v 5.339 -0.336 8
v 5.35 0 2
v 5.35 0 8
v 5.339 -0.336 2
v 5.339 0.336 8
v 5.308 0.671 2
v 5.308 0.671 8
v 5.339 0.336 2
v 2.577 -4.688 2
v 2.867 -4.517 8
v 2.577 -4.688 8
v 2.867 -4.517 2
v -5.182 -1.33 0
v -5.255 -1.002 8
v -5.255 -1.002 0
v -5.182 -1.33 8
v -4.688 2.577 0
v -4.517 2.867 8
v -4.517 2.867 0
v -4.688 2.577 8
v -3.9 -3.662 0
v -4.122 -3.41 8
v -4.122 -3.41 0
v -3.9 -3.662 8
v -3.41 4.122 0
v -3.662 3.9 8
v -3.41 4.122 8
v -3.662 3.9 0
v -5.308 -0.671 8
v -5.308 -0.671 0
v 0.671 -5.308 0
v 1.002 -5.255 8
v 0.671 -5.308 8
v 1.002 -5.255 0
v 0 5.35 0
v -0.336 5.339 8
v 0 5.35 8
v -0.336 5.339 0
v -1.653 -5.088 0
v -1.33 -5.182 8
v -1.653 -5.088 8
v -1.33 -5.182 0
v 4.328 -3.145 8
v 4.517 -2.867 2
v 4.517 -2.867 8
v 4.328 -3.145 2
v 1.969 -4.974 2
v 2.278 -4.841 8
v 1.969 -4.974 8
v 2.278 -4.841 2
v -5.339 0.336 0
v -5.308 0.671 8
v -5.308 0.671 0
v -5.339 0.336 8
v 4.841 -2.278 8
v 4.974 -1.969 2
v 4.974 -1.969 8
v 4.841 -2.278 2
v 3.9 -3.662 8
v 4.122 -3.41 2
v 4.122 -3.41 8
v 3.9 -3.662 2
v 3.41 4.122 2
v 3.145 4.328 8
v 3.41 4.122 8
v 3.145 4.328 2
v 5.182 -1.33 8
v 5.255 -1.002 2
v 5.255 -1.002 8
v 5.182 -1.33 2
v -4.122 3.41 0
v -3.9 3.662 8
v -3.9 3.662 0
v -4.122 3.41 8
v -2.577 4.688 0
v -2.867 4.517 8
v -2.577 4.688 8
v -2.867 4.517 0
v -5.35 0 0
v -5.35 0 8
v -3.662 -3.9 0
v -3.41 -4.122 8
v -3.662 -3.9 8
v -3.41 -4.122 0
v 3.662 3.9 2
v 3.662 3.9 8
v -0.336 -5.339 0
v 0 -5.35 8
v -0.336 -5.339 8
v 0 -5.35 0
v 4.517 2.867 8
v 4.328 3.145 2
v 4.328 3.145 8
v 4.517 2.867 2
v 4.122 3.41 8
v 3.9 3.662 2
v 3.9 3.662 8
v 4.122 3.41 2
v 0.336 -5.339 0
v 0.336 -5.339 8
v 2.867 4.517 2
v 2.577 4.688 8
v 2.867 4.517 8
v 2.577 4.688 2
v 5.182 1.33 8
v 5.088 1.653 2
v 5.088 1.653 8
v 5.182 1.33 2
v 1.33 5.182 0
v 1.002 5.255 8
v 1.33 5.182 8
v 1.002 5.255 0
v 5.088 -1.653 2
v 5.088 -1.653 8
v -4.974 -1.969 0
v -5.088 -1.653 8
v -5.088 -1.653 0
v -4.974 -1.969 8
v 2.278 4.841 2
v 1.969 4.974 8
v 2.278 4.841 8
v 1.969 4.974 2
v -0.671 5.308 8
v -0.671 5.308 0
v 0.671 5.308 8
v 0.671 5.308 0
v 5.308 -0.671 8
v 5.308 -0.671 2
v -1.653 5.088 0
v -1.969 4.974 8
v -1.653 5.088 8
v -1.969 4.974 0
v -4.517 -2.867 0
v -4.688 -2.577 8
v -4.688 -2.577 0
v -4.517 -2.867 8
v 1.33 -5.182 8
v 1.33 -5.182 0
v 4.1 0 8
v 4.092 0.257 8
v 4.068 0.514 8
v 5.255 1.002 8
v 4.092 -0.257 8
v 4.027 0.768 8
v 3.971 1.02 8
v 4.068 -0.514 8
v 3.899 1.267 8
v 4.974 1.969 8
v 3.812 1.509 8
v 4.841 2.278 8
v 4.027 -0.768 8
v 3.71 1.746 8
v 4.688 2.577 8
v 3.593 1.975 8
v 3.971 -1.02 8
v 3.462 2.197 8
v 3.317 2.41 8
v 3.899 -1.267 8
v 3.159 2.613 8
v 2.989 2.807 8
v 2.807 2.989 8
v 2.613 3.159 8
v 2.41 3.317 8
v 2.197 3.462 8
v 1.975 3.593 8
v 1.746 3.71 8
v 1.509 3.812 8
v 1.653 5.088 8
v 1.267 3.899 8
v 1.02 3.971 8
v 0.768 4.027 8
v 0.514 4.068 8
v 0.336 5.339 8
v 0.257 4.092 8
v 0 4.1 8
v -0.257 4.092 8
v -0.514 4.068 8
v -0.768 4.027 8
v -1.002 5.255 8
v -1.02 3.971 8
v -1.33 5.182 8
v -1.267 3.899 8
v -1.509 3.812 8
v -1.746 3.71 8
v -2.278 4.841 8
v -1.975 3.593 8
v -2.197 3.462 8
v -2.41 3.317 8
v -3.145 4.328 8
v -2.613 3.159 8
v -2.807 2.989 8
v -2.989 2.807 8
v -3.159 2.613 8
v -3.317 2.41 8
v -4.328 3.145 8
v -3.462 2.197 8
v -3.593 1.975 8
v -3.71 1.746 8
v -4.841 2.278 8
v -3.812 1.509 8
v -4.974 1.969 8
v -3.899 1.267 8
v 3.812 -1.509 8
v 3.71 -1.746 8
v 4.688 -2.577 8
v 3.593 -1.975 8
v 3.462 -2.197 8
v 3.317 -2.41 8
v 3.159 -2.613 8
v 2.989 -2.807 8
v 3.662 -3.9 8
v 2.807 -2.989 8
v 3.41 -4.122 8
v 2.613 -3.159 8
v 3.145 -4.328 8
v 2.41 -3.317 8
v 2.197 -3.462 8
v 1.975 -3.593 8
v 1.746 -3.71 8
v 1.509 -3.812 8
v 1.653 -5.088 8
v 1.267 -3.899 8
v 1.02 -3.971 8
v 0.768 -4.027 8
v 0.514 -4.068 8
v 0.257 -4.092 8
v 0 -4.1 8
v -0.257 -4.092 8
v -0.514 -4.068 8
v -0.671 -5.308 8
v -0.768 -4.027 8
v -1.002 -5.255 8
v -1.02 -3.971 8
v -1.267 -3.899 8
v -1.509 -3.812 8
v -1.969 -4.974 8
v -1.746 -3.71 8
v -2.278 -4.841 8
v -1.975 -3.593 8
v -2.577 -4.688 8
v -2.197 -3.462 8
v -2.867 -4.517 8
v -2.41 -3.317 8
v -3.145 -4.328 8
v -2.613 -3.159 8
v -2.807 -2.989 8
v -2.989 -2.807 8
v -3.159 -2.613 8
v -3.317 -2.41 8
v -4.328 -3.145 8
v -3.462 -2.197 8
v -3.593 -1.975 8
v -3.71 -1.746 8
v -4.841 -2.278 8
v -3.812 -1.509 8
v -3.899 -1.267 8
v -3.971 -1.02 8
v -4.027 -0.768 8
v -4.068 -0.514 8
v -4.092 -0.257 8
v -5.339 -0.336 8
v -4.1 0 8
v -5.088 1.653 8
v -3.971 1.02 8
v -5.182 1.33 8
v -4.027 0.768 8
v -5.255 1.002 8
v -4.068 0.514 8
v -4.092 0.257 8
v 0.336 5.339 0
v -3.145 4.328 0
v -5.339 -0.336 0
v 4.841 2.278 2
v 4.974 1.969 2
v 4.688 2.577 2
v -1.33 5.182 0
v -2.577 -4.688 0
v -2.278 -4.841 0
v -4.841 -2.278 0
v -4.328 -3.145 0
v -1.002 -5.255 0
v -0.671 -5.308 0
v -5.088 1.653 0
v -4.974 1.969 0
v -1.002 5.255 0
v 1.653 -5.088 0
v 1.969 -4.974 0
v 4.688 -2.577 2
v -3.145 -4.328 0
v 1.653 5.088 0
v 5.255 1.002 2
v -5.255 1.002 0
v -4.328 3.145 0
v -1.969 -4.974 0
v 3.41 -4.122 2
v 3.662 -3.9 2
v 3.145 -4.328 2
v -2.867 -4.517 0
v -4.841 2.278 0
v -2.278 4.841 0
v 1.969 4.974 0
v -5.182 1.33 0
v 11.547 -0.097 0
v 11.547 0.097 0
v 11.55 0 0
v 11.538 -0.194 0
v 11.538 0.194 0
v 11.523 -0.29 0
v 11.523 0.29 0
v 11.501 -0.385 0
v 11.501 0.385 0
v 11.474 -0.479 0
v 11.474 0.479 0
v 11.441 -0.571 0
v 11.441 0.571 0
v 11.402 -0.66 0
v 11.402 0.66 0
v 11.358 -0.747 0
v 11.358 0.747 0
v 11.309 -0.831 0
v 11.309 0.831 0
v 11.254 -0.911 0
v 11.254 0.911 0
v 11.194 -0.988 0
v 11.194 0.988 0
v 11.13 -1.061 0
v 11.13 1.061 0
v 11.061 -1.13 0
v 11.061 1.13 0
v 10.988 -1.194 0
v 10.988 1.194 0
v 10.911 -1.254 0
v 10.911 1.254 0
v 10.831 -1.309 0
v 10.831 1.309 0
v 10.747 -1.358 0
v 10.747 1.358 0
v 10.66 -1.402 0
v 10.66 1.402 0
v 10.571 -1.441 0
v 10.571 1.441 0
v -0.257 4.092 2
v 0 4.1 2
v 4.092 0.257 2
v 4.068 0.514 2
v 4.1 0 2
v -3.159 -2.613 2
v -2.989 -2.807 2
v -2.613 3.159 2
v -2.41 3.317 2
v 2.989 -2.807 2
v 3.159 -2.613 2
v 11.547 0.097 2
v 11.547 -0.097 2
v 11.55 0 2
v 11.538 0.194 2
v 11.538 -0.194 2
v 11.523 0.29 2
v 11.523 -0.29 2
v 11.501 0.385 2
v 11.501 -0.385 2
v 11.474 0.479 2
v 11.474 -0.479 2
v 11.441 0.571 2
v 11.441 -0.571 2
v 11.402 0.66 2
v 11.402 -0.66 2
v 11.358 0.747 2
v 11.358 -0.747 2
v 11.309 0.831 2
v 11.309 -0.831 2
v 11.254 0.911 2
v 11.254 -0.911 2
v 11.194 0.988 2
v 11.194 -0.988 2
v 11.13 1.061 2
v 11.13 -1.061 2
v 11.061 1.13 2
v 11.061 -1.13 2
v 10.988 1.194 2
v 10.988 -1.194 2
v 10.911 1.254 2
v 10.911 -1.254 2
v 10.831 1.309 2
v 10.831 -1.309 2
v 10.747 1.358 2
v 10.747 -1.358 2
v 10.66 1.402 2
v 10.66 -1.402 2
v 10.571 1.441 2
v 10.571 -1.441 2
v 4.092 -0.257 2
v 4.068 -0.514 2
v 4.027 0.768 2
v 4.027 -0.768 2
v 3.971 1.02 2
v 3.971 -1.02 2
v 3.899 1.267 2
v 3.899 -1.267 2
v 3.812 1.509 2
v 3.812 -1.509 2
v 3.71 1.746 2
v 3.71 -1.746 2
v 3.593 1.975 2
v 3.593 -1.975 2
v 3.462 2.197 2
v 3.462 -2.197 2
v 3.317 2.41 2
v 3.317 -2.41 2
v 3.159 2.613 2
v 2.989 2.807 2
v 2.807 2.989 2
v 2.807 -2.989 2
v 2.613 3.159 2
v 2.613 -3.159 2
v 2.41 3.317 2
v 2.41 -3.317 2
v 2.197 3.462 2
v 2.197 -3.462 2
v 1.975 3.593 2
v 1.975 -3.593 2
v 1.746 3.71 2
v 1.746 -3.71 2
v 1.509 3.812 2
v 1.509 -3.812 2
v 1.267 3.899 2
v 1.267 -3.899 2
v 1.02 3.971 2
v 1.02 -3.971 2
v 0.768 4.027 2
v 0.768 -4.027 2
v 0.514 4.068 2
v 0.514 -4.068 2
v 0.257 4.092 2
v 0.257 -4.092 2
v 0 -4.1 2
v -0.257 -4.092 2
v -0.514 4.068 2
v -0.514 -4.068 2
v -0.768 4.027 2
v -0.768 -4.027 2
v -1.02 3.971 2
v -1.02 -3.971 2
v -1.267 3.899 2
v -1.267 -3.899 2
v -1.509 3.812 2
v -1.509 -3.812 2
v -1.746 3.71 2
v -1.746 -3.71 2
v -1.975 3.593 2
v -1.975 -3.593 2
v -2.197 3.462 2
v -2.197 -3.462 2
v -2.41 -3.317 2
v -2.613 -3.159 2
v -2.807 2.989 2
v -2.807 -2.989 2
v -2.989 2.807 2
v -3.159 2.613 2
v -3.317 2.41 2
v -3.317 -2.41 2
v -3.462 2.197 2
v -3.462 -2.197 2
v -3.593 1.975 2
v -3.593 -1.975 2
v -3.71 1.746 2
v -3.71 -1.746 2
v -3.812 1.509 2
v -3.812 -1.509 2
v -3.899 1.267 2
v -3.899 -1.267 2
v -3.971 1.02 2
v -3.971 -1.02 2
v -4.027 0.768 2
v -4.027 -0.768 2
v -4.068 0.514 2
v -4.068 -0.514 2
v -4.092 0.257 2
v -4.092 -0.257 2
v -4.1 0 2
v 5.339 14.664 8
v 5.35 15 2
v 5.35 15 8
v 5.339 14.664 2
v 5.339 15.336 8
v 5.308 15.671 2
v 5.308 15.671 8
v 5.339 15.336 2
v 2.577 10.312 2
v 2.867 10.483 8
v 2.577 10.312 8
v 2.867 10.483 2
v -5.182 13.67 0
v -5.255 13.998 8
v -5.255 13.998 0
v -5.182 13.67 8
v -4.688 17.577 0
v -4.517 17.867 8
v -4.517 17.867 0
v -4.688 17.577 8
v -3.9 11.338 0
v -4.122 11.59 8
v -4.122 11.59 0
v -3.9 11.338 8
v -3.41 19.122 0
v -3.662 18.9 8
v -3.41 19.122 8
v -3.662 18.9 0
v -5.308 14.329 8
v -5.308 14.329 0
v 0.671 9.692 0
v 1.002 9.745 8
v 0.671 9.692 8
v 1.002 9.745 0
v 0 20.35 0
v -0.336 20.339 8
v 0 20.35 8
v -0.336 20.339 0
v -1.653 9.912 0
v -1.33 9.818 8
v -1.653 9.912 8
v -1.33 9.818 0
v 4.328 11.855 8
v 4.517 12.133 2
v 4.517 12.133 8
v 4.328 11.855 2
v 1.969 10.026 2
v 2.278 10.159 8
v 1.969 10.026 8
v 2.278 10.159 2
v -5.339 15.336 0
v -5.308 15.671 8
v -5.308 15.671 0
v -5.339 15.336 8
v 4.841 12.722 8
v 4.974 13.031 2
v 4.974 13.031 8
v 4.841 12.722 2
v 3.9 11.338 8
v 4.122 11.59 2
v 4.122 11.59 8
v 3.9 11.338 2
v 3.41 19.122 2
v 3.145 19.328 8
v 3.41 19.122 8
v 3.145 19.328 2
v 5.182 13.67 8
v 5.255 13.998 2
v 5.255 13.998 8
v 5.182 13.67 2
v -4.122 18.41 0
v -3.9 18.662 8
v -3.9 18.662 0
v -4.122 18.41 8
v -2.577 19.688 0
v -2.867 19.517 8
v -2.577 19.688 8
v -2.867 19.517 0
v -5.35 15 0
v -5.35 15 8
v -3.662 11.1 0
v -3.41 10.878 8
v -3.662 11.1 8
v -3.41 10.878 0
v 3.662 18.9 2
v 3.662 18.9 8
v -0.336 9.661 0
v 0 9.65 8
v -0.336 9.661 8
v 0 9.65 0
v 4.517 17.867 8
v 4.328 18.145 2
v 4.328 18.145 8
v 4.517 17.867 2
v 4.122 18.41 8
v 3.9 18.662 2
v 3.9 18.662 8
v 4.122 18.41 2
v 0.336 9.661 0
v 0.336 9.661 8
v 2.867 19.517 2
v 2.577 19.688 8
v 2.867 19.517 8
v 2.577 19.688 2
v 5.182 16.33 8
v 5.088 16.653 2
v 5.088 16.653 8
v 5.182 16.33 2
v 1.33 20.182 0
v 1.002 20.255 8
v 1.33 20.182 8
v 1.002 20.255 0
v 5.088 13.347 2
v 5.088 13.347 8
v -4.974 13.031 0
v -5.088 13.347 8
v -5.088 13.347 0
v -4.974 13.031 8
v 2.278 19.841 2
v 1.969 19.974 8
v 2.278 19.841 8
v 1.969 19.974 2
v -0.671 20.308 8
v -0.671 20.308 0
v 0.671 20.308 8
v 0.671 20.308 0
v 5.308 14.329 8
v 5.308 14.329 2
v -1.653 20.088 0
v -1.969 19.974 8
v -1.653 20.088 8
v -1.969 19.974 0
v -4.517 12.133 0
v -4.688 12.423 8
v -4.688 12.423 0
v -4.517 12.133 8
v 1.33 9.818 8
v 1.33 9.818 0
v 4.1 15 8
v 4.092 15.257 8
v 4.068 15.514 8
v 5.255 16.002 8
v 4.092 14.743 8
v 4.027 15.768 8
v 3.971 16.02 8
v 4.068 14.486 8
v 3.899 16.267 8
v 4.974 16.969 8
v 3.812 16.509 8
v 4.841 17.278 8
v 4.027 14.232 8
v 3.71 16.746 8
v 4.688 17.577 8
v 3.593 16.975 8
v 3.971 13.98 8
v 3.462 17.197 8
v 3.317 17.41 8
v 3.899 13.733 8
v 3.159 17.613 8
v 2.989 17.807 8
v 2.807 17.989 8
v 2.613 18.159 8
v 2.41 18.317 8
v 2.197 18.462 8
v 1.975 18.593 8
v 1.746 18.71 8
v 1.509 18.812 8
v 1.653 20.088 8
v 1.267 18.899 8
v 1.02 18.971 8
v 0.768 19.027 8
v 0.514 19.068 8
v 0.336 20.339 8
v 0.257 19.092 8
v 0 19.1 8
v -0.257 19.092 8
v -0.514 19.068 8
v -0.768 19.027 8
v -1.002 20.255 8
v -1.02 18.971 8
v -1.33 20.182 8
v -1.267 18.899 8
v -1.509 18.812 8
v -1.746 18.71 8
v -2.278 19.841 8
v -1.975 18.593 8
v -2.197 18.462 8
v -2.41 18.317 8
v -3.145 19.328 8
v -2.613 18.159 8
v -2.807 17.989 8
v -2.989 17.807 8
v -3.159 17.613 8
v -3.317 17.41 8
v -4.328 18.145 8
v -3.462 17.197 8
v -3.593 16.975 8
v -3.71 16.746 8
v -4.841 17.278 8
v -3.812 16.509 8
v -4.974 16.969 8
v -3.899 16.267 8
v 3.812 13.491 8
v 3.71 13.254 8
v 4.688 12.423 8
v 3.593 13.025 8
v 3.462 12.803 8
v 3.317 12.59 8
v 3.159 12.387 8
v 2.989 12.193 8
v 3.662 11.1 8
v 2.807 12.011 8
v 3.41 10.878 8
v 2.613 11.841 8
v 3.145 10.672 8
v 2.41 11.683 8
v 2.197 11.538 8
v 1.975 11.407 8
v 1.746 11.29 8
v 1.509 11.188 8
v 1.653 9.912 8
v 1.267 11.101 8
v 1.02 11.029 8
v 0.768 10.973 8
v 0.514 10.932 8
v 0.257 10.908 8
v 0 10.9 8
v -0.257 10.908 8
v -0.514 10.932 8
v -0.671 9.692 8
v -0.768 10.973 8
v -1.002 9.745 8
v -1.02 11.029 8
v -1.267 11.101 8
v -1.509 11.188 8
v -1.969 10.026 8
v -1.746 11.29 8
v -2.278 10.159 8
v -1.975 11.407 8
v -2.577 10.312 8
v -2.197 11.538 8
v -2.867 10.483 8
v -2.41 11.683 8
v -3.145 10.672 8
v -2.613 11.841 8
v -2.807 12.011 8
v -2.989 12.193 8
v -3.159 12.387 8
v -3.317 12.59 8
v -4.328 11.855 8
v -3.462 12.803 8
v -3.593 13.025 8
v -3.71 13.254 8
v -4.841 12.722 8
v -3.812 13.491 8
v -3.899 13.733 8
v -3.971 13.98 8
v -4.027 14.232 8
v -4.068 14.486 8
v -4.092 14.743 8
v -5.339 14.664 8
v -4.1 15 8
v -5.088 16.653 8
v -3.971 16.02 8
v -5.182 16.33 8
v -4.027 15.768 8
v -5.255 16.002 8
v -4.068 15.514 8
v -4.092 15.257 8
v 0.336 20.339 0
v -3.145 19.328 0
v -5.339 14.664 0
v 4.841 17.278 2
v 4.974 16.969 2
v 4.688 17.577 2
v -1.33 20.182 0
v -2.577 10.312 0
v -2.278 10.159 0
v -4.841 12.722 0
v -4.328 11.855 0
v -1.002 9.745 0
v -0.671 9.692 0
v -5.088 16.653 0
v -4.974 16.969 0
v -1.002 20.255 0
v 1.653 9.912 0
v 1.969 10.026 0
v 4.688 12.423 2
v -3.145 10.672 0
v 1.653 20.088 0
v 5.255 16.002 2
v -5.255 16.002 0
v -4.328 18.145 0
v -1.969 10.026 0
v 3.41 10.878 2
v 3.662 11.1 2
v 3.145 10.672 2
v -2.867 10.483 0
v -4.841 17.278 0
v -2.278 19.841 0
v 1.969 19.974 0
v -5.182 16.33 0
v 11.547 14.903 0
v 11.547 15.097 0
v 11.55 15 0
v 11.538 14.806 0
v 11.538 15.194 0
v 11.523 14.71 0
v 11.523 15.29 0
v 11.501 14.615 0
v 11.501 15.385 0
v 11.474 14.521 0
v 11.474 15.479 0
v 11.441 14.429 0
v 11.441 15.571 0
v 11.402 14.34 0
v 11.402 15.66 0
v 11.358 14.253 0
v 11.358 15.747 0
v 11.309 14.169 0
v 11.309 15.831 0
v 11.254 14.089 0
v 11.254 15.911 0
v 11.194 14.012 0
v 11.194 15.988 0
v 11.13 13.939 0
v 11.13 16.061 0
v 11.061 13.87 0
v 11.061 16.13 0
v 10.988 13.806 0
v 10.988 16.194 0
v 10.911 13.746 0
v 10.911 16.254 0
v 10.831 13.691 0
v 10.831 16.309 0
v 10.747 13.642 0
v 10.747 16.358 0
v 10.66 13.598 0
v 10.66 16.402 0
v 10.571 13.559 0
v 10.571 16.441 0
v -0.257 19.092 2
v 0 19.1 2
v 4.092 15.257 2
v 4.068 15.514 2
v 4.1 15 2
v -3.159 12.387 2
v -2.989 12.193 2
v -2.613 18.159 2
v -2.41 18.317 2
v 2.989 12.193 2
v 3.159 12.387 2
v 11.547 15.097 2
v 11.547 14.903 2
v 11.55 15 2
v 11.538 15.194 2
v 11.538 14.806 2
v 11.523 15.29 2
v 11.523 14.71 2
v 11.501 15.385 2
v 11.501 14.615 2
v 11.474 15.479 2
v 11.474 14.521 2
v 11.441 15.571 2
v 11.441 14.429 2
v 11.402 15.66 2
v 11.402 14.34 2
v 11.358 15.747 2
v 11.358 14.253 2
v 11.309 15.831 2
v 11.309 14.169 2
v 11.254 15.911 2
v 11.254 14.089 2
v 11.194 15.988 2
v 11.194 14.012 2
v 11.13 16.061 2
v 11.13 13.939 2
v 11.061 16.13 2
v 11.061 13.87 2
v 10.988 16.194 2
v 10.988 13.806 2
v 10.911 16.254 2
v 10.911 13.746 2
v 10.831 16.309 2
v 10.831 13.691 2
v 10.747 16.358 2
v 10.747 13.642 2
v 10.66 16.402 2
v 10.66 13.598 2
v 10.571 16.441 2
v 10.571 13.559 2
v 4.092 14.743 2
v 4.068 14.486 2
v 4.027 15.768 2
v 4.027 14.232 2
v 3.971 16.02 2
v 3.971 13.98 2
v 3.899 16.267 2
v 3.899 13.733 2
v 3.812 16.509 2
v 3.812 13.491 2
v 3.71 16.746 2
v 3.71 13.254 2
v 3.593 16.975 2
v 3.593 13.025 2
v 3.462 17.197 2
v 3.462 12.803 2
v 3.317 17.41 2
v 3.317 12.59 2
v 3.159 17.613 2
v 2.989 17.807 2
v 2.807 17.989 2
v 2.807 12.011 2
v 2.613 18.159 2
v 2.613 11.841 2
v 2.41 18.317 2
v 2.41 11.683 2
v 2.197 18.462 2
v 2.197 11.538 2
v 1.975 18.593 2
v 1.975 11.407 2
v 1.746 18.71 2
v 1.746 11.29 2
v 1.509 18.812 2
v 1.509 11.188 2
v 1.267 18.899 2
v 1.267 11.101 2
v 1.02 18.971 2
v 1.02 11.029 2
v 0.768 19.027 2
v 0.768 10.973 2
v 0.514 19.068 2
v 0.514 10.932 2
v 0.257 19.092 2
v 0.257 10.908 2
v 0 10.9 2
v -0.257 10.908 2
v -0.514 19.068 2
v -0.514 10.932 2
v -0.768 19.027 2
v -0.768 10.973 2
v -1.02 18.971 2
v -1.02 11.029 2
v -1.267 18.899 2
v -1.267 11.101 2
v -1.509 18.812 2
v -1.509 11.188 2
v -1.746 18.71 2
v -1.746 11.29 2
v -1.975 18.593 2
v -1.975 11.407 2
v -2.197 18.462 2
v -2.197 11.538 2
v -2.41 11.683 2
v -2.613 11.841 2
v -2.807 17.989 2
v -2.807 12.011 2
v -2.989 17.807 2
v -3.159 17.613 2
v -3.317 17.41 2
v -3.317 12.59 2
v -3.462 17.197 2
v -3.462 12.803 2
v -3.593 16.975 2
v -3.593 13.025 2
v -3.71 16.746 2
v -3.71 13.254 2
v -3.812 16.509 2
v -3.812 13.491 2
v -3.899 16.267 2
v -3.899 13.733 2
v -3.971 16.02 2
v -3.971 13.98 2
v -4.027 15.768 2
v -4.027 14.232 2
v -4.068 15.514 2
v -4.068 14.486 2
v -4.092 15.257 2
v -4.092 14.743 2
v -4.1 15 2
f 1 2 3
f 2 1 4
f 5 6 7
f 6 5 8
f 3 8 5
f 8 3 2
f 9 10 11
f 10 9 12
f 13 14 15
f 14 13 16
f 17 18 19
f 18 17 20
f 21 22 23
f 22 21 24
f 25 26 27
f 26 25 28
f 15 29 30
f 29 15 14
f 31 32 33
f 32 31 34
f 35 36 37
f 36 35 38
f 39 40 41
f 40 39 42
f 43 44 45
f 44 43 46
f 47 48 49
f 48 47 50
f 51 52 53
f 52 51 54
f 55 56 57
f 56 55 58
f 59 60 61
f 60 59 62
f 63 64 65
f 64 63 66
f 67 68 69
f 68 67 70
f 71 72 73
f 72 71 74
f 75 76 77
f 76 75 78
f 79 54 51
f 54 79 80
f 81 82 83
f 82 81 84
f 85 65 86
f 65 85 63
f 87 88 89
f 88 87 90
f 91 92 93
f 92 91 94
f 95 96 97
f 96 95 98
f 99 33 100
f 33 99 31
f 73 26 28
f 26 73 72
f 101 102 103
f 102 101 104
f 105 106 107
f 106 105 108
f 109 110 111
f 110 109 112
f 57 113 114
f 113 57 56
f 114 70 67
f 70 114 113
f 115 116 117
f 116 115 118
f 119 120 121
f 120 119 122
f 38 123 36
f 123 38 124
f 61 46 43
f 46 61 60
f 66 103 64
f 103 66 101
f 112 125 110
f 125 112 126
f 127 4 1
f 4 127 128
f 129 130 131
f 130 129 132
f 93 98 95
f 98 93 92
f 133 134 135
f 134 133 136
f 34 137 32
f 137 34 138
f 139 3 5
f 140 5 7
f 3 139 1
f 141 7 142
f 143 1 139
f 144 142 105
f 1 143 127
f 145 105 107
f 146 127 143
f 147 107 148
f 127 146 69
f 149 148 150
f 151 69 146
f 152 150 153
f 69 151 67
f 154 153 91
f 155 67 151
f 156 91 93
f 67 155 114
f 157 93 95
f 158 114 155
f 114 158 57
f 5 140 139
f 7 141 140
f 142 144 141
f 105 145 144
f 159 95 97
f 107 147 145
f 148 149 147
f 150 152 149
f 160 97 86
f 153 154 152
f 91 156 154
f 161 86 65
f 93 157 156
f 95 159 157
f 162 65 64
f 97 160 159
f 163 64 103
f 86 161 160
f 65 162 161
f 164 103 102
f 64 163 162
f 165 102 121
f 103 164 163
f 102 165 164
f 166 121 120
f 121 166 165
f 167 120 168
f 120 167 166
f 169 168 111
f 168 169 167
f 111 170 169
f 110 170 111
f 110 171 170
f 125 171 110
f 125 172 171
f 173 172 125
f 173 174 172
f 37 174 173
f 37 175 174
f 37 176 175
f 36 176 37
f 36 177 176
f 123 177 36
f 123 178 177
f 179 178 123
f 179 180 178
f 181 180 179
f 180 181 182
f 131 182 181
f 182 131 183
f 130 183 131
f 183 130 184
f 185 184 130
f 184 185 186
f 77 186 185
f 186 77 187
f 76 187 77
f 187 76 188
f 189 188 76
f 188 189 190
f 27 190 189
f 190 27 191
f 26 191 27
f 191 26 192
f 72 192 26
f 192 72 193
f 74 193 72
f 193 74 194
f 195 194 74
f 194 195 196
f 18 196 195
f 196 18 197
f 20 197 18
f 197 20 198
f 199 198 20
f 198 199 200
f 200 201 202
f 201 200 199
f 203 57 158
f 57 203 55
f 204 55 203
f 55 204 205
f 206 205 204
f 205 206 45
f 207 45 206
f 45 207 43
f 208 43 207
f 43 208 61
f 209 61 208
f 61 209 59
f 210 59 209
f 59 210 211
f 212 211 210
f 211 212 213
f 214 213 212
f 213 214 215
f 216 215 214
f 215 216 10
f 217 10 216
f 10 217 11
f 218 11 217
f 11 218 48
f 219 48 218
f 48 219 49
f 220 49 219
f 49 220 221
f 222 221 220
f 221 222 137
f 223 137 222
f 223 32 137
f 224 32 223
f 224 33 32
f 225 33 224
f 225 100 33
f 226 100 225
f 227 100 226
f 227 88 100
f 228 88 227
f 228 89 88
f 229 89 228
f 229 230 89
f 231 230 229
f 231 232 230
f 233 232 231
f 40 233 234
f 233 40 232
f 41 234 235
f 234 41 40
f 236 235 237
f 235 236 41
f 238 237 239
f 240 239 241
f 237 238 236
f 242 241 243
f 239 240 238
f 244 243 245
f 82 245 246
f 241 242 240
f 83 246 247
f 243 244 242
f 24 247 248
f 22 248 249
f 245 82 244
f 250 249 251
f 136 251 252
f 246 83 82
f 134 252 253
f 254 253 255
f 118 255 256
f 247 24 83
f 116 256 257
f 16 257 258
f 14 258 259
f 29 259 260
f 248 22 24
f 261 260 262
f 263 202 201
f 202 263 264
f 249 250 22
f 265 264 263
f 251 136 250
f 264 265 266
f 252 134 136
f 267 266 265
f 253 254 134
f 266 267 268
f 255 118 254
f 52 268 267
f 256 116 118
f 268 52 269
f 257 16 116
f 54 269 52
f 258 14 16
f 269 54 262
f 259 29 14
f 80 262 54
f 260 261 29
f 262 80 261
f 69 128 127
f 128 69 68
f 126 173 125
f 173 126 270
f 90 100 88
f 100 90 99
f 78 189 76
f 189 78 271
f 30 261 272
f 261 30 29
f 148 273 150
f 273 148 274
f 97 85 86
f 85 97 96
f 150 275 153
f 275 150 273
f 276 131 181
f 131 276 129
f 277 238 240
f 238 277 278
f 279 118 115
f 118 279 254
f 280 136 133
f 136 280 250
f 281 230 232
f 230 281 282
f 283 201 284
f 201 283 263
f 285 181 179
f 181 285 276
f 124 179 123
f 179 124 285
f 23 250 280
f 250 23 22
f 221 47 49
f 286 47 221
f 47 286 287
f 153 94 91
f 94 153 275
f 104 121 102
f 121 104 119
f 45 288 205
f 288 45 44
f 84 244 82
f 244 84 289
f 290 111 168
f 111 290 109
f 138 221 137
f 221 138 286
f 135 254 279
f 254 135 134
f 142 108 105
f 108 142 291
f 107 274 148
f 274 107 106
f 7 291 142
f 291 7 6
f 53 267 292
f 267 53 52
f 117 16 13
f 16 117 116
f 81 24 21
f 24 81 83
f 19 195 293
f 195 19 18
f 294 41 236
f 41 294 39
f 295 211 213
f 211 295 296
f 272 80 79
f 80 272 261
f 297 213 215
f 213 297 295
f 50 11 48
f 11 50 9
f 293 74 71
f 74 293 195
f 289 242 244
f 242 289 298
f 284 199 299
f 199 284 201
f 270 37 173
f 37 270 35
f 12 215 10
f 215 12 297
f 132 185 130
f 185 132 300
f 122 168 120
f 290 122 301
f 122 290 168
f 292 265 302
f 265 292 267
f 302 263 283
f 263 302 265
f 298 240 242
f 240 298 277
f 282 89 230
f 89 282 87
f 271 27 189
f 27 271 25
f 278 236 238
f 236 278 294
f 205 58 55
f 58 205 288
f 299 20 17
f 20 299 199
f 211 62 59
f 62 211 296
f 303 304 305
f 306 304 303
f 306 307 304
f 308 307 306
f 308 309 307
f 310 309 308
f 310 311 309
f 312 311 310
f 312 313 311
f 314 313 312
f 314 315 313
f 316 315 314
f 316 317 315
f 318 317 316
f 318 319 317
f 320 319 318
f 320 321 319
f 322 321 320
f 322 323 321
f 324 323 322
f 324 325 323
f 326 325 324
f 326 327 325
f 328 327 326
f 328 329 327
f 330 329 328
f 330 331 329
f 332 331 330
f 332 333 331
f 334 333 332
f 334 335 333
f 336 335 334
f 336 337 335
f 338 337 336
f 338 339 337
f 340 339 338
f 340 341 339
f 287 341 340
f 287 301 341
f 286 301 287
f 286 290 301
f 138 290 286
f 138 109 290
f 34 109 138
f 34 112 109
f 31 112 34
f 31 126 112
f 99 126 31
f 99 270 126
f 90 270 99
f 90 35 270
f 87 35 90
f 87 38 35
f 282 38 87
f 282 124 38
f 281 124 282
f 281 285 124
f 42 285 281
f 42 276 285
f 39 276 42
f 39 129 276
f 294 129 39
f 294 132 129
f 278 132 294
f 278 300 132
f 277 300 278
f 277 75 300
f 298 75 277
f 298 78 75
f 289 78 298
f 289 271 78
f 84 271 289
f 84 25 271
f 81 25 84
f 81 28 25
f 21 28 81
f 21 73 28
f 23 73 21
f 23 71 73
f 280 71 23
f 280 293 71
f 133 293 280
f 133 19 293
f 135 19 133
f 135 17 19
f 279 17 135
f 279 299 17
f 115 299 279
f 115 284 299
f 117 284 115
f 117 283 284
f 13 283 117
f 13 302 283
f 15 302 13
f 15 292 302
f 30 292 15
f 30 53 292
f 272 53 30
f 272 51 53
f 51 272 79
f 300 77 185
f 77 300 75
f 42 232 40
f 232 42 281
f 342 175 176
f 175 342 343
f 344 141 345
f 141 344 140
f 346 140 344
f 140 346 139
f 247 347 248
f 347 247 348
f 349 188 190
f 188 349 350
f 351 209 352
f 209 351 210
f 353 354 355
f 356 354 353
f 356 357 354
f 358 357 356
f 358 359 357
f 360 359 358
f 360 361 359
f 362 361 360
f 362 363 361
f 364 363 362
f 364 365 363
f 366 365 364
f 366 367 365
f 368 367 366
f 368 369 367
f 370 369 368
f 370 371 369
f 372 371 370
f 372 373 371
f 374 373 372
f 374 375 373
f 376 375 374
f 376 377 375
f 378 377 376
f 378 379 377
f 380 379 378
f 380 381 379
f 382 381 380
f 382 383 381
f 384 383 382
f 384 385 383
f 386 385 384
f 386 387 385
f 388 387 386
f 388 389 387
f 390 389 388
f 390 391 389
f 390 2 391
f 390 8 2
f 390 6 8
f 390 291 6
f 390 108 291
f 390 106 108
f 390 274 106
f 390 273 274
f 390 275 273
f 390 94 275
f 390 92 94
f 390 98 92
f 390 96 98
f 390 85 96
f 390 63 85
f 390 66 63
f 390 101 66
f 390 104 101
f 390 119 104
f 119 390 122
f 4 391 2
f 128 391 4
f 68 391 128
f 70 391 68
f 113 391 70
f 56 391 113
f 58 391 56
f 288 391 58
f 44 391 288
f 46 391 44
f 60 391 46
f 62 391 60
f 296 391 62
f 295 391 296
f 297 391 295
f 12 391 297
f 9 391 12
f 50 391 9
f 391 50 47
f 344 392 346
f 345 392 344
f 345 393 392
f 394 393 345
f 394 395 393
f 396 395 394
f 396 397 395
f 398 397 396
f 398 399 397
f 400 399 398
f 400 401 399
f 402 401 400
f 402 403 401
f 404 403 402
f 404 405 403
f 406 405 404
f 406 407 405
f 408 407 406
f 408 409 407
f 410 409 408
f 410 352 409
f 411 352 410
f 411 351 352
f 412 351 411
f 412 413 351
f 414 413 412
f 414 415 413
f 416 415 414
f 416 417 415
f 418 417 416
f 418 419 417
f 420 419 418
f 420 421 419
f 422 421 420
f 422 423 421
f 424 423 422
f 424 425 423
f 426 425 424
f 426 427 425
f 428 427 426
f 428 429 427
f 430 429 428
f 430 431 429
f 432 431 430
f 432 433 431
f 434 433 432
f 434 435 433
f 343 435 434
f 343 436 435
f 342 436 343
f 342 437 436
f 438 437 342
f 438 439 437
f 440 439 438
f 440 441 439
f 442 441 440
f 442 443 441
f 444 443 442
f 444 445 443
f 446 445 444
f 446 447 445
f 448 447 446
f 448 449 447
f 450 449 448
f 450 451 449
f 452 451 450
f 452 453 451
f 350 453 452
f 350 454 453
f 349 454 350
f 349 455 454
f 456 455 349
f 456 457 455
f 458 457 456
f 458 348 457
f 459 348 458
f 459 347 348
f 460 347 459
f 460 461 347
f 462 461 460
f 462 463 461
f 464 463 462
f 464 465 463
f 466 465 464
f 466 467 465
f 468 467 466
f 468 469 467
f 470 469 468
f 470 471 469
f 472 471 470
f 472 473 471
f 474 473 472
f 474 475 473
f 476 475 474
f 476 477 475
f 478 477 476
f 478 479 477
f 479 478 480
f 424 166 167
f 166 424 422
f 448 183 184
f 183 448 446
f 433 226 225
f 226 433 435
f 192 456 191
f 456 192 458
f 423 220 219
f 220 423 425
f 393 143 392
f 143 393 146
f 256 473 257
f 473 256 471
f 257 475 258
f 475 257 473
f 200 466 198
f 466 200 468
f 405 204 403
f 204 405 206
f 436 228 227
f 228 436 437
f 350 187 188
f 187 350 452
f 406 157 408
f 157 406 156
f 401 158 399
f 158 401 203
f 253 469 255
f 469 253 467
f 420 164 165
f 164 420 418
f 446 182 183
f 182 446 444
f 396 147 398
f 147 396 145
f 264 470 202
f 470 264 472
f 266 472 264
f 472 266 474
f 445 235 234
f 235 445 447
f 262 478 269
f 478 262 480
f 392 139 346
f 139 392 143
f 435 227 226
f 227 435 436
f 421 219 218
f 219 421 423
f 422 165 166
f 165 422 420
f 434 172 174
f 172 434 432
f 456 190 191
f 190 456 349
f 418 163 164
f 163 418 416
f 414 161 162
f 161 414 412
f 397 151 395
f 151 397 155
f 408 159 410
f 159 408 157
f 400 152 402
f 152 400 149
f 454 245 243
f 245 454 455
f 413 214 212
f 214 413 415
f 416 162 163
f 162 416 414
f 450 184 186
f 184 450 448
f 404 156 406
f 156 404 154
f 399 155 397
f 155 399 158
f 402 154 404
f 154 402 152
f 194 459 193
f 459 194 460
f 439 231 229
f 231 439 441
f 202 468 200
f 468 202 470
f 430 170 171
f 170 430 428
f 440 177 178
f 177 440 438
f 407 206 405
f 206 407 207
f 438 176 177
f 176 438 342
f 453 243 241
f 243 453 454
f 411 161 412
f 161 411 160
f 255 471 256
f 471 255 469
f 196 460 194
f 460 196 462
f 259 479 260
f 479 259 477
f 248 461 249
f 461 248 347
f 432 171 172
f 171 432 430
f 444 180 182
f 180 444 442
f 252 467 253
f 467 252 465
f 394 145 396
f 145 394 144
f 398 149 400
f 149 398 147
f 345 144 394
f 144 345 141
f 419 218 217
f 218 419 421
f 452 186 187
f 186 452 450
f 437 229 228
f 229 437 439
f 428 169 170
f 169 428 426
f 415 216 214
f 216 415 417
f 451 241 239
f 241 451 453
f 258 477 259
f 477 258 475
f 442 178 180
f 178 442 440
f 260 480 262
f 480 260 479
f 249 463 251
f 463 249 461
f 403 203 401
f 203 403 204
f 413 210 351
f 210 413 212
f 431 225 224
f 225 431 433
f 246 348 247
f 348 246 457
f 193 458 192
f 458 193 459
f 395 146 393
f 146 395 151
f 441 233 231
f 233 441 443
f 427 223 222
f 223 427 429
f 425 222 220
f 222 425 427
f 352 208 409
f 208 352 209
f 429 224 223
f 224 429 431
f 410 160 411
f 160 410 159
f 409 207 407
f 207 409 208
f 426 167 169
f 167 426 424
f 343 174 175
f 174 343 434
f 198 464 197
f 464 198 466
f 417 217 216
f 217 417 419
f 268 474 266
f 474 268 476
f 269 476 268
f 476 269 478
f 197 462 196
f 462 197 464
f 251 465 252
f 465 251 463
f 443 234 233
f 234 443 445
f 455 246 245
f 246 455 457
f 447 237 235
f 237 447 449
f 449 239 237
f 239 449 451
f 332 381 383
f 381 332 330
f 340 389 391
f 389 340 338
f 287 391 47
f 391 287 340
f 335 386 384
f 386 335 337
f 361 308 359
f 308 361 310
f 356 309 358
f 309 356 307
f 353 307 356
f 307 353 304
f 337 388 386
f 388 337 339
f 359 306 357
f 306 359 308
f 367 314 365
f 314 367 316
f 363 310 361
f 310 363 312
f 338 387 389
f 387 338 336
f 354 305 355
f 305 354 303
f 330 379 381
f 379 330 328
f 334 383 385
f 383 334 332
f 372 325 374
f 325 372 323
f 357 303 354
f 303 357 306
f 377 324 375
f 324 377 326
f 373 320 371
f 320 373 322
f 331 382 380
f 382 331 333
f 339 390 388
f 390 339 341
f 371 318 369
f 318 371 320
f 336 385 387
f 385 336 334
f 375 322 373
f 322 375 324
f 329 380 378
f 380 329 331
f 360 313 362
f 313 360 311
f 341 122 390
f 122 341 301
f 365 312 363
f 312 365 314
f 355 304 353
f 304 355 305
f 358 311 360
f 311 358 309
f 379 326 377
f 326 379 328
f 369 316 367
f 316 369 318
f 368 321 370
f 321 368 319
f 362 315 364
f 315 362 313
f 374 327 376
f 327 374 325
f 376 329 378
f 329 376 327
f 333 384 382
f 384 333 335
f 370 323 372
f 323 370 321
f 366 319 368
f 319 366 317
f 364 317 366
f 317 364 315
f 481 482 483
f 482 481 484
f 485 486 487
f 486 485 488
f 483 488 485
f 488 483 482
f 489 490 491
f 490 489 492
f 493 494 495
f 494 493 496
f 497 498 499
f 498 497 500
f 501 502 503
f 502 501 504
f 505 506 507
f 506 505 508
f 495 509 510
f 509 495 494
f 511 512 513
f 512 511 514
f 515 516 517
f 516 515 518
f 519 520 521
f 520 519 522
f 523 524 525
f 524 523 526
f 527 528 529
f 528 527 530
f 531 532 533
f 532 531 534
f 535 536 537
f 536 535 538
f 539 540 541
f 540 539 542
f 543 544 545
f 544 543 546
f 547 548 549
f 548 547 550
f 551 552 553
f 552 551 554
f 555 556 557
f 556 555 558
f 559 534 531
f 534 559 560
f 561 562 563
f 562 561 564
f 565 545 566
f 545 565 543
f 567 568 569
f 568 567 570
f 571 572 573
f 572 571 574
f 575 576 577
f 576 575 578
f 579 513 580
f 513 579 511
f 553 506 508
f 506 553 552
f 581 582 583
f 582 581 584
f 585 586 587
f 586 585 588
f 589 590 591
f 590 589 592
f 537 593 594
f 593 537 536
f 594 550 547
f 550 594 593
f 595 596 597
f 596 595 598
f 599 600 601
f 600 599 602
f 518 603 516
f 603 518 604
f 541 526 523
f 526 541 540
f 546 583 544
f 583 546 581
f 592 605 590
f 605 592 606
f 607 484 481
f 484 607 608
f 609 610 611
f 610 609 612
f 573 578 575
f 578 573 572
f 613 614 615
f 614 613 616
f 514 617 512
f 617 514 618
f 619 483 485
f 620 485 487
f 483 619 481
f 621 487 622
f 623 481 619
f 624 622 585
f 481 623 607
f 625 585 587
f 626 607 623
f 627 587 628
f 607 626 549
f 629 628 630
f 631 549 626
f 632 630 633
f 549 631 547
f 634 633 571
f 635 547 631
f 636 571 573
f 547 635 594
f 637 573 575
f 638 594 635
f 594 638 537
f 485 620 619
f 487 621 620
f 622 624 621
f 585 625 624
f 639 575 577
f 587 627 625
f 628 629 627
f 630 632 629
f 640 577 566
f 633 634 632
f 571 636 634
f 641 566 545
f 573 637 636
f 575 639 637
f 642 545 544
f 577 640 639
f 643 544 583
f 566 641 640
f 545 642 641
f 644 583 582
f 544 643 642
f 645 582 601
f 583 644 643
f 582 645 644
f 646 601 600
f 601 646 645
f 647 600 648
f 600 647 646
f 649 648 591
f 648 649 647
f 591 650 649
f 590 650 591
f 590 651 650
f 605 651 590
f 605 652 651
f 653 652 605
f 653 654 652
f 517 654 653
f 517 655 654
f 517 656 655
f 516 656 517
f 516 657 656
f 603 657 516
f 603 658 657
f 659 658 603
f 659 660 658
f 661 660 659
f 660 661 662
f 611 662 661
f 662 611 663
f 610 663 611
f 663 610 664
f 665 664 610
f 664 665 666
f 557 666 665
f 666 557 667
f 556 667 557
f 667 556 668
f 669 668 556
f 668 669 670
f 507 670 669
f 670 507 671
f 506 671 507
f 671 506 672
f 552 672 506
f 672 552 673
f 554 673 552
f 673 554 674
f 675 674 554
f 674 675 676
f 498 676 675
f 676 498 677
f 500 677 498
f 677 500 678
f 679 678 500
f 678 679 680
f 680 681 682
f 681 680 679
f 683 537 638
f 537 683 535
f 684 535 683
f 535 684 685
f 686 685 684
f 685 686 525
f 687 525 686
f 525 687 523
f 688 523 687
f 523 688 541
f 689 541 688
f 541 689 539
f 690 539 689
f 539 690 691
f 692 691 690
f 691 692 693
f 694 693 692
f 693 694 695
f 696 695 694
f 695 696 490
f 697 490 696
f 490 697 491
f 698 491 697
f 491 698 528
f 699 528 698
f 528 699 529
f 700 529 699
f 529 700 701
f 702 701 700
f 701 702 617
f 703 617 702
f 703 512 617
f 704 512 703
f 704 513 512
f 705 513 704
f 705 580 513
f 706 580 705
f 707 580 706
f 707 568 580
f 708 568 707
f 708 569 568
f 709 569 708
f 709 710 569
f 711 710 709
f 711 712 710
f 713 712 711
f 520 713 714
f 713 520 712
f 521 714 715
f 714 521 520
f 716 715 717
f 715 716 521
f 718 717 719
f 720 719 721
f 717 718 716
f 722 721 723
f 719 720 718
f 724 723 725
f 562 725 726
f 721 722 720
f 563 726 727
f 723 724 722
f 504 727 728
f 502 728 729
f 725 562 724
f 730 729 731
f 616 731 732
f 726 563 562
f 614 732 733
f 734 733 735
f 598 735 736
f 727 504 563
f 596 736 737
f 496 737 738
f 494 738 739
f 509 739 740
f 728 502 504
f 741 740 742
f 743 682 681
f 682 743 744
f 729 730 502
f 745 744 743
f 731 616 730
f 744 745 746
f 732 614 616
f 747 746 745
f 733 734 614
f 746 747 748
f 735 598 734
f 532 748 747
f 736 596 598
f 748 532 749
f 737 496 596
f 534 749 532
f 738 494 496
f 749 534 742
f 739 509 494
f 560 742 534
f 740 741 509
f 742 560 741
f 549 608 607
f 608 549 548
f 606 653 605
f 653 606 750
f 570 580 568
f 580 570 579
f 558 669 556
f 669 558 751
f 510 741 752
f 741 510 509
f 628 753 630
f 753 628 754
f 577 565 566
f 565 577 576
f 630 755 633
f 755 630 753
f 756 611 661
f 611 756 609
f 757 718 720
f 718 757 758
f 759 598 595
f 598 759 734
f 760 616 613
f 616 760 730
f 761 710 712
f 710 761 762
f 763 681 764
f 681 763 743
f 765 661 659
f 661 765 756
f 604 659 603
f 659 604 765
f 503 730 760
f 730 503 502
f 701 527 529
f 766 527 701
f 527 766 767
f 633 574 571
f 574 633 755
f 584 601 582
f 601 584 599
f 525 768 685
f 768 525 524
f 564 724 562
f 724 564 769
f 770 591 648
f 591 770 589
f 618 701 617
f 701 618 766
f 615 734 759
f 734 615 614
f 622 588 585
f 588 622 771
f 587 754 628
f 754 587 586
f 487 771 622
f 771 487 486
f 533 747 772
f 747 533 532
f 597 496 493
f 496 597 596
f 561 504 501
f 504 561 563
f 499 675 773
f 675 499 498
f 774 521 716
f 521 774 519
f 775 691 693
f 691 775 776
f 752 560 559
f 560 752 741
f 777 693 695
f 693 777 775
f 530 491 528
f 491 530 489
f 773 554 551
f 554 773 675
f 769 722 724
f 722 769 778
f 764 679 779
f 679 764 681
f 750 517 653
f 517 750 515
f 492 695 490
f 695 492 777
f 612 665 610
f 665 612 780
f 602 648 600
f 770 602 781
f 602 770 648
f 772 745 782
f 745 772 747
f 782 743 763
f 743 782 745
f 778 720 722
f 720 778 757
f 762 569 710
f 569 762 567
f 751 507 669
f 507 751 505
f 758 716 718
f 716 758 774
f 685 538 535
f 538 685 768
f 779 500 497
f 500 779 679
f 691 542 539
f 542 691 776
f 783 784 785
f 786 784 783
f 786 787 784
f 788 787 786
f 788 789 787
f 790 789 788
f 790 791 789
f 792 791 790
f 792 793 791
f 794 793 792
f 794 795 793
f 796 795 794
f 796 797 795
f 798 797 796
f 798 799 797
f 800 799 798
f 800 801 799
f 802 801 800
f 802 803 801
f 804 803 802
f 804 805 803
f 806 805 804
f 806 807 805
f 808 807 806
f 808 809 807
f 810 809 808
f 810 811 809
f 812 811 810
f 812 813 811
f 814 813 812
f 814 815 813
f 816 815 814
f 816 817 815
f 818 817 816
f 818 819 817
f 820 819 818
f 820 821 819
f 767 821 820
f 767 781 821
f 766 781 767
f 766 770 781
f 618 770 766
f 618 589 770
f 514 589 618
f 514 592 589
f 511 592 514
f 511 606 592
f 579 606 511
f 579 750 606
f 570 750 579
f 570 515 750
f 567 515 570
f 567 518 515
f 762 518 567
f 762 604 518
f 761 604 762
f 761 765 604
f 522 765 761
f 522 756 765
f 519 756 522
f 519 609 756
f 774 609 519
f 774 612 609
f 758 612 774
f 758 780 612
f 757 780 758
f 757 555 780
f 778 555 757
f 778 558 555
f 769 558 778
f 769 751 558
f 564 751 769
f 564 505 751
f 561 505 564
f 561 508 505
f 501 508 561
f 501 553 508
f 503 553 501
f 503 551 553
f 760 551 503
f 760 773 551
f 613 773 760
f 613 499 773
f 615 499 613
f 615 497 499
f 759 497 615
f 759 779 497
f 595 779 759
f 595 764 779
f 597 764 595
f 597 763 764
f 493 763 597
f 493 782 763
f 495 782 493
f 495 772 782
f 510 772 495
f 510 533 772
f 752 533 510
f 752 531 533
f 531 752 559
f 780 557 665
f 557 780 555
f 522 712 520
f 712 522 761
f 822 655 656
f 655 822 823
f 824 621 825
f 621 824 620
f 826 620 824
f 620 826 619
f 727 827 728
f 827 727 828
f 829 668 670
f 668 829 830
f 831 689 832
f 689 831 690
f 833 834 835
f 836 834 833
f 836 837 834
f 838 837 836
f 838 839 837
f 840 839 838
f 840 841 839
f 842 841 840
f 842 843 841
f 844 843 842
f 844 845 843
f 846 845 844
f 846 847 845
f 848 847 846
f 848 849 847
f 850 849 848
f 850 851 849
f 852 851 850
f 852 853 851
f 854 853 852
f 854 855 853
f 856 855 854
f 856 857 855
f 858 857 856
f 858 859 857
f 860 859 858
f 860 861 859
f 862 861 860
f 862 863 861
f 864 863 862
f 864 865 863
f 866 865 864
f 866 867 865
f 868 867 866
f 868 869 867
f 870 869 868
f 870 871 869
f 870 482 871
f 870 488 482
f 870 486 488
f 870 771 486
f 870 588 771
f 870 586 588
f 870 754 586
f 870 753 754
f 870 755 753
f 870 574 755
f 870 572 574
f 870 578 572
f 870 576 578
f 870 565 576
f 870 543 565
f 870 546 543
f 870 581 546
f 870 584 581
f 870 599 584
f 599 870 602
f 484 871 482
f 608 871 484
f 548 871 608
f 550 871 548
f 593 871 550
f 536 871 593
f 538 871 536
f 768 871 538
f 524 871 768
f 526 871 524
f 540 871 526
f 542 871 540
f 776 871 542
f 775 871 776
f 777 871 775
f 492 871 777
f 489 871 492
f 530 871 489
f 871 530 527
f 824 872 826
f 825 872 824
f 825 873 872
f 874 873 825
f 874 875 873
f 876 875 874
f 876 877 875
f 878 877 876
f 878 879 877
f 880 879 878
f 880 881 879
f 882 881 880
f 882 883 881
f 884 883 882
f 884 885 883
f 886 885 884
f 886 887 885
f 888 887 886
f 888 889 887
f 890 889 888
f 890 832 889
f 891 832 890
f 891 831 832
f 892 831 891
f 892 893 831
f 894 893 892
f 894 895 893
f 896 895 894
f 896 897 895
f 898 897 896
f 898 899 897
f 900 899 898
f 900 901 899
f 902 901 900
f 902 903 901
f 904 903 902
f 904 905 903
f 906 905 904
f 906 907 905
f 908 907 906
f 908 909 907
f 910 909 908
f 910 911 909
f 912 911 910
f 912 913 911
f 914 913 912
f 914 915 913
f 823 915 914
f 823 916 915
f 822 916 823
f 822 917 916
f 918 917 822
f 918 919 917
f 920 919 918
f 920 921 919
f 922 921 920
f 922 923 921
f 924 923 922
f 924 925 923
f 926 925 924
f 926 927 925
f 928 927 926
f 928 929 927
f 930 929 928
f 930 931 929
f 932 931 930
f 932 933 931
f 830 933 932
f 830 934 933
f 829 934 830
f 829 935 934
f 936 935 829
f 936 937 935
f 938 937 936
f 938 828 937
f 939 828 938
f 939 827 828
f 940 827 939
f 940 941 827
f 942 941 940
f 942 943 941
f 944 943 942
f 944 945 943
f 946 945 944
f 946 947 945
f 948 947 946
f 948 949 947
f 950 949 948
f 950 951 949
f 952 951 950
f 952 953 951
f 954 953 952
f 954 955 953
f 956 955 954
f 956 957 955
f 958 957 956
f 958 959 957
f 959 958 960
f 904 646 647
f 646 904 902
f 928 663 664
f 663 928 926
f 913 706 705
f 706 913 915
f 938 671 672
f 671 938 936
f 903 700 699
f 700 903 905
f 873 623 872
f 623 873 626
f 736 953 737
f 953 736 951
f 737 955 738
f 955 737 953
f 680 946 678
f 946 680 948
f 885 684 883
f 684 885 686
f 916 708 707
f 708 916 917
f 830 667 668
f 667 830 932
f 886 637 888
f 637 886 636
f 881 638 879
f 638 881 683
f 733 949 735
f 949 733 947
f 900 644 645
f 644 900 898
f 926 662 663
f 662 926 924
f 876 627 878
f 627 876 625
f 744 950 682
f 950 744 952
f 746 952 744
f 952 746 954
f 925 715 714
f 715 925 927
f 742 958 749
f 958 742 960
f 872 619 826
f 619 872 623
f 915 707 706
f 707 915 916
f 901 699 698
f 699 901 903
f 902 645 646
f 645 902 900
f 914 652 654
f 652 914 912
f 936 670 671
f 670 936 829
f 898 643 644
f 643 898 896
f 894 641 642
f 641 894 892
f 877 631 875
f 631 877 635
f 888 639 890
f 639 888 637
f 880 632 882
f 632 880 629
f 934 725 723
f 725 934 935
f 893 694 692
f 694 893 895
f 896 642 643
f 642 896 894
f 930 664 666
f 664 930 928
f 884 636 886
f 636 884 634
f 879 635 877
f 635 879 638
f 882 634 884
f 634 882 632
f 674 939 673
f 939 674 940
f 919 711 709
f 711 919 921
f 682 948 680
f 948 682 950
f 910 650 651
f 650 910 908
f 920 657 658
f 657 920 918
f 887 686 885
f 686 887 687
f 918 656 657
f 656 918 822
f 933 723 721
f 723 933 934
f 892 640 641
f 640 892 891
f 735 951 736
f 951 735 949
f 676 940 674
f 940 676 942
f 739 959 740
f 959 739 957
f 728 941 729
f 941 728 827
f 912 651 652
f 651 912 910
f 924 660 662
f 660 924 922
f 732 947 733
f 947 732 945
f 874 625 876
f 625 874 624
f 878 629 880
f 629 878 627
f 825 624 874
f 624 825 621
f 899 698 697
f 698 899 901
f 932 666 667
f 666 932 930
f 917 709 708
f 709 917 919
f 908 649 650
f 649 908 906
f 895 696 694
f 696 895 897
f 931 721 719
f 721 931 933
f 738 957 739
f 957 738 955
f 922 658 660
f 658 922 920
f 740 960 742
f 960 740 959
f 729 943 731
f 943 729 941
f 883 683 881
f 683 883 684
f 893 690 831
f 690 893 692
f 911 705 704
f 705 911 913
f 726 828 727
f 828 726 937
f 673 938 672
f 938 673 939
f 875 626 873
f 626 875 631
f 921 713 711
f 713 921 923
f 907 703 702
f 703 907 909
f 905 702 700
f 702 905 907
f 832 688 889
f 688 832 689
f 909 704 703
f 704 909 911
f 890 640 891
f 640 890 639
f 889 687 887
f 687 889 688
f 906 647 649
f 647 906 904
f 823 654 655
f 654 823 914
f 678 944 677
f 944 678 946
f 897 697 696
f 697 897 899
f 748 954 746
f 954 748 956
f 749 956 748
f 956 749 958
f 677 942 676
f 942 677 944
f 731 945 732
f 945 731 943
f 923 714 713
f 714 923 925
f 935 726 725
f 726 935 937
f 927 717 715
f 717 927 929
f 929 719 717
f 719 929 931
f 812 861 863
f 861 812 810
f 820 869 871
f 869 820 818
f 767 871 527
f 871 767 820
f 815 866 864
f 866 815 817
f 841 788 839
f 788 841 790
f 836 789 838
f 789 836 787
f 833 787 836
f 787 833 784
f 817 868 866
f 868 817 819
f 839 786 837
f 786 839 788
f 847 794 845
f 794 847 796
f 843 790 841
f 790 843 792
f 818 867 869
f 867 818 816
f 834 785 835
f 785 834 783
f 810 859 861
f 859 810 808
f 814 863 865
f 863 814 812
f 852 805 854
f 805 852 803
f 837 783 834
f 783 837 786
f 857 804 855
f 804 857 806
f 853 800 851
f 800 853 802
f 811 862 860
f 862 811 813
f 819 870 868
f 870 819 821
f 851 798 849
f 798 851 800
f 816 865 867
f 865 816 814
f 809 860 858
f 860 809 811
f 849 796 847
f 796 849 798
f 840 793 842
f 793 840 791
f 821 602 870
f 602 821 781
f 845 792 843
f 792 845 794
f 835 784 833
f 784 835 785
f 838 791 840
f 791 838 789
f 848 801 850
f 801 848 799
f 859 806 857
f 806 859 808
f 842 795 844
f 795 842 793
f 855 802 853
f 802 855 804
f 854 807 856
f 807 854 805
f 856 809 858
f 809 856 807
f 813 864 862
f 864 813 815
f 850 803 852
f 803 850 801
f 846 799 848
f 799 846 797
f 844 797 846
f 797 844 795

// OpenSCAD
// file: inc/screwsizes.scad
/////////////////////////////////////////////////////////////////////////////////
// screwsizes.scad - has the screw sizes I use
/////////////////////////////////////////////////////////////////////////////////
// created 7/13/2016
// last update 10/13/20
////////////////////////////////////////////////////////////////////////////////
// 8/6/19	- Add nut3 wrench size and corner to cornrer size
// 5/31/20	- Added some countersink depth sizes
// 6/11/20	- Get a set of M2,M3,M4,M5 brass inserts by DYWISHKEY from amazon.com
// 7/12/20	- Adjusted brass insert size hole sizes
// 8/4/20	- Added 2.5mm screw sizes
// 10/13/20	- Updated brass insert comments
/////////////////////////////////////////////////////////////////////////////////
screw2 = 3.1;
screw2t=2.1;
screw2hd=4.5;
screw2in = 3;		// 2mm brass insert
screw2p5 = 3.1;
screw2p5t=2.1;
screw2p5hd=4.5;
screw2p5in = 3.3;	// 2.5mm brass insert
screw3 = 3.6;
screw3inS = 4.1;	// 3mm small brass insert
screw3inL = 4.9;	// 3mm large brass insert
screw3t = 2.6;
screw3hd = 6.5;
screw3cs = 3;
screw4 = 4.5;
screw4t = 3.5;
screw4hd = 7.5;
screw4cs = 4;
screw4in = 5.9;		// 4mm brass insert
screw5 = 5.8;
screw5t = 4.5;
screw5hd = 11;
screw5cs = 4;
screw5in = 6.9;		// 5mm brass insert
screw8 = 8.7;
nut3 = 5.5;
nut3c = 5.3;
nut4 = 7;
nut5 = 8;
//////////////////////////////////////////////////////////////////////////////////
// main file
//////////////////////////////////////////////////////////////////////////
// Leadscrew-Top.scad - something to make it easy to see z screw rotation
//////////////////////////////////////////////////////////////////////////
// created 9/4/16
// last upate 9/4/16
//////////////////////////////////////////////////////////////////////////
include <inc/screwsizes.scad>
//////////////////////////////////////////////////////////////////////////
$fn=100;
//////////////////////////////////////////////////////////////////////////

top(2);

//////////////////////////////////////////////////////////////////////////

module top(Qty=1) {
	for(x=[0:Qty-1]) {
		translate([0,x*15,0]) {
			difference() {
				color("cyan") cylinder(h=8,d=screw8+2);
				translate([0,0,2]) color("red") cylinder(h=8,d=screw8-0.5); // make diameter small enough to fit tightly
			}
			color("black") hull() {
				cylinder(h=2,d=screw8+2);
				translate([10,0,0]) cylinder(h=2,d=screw2);
			}
		}
	}
}

///////////////////////// end of leadscrewtop.scad ///////////////////////
